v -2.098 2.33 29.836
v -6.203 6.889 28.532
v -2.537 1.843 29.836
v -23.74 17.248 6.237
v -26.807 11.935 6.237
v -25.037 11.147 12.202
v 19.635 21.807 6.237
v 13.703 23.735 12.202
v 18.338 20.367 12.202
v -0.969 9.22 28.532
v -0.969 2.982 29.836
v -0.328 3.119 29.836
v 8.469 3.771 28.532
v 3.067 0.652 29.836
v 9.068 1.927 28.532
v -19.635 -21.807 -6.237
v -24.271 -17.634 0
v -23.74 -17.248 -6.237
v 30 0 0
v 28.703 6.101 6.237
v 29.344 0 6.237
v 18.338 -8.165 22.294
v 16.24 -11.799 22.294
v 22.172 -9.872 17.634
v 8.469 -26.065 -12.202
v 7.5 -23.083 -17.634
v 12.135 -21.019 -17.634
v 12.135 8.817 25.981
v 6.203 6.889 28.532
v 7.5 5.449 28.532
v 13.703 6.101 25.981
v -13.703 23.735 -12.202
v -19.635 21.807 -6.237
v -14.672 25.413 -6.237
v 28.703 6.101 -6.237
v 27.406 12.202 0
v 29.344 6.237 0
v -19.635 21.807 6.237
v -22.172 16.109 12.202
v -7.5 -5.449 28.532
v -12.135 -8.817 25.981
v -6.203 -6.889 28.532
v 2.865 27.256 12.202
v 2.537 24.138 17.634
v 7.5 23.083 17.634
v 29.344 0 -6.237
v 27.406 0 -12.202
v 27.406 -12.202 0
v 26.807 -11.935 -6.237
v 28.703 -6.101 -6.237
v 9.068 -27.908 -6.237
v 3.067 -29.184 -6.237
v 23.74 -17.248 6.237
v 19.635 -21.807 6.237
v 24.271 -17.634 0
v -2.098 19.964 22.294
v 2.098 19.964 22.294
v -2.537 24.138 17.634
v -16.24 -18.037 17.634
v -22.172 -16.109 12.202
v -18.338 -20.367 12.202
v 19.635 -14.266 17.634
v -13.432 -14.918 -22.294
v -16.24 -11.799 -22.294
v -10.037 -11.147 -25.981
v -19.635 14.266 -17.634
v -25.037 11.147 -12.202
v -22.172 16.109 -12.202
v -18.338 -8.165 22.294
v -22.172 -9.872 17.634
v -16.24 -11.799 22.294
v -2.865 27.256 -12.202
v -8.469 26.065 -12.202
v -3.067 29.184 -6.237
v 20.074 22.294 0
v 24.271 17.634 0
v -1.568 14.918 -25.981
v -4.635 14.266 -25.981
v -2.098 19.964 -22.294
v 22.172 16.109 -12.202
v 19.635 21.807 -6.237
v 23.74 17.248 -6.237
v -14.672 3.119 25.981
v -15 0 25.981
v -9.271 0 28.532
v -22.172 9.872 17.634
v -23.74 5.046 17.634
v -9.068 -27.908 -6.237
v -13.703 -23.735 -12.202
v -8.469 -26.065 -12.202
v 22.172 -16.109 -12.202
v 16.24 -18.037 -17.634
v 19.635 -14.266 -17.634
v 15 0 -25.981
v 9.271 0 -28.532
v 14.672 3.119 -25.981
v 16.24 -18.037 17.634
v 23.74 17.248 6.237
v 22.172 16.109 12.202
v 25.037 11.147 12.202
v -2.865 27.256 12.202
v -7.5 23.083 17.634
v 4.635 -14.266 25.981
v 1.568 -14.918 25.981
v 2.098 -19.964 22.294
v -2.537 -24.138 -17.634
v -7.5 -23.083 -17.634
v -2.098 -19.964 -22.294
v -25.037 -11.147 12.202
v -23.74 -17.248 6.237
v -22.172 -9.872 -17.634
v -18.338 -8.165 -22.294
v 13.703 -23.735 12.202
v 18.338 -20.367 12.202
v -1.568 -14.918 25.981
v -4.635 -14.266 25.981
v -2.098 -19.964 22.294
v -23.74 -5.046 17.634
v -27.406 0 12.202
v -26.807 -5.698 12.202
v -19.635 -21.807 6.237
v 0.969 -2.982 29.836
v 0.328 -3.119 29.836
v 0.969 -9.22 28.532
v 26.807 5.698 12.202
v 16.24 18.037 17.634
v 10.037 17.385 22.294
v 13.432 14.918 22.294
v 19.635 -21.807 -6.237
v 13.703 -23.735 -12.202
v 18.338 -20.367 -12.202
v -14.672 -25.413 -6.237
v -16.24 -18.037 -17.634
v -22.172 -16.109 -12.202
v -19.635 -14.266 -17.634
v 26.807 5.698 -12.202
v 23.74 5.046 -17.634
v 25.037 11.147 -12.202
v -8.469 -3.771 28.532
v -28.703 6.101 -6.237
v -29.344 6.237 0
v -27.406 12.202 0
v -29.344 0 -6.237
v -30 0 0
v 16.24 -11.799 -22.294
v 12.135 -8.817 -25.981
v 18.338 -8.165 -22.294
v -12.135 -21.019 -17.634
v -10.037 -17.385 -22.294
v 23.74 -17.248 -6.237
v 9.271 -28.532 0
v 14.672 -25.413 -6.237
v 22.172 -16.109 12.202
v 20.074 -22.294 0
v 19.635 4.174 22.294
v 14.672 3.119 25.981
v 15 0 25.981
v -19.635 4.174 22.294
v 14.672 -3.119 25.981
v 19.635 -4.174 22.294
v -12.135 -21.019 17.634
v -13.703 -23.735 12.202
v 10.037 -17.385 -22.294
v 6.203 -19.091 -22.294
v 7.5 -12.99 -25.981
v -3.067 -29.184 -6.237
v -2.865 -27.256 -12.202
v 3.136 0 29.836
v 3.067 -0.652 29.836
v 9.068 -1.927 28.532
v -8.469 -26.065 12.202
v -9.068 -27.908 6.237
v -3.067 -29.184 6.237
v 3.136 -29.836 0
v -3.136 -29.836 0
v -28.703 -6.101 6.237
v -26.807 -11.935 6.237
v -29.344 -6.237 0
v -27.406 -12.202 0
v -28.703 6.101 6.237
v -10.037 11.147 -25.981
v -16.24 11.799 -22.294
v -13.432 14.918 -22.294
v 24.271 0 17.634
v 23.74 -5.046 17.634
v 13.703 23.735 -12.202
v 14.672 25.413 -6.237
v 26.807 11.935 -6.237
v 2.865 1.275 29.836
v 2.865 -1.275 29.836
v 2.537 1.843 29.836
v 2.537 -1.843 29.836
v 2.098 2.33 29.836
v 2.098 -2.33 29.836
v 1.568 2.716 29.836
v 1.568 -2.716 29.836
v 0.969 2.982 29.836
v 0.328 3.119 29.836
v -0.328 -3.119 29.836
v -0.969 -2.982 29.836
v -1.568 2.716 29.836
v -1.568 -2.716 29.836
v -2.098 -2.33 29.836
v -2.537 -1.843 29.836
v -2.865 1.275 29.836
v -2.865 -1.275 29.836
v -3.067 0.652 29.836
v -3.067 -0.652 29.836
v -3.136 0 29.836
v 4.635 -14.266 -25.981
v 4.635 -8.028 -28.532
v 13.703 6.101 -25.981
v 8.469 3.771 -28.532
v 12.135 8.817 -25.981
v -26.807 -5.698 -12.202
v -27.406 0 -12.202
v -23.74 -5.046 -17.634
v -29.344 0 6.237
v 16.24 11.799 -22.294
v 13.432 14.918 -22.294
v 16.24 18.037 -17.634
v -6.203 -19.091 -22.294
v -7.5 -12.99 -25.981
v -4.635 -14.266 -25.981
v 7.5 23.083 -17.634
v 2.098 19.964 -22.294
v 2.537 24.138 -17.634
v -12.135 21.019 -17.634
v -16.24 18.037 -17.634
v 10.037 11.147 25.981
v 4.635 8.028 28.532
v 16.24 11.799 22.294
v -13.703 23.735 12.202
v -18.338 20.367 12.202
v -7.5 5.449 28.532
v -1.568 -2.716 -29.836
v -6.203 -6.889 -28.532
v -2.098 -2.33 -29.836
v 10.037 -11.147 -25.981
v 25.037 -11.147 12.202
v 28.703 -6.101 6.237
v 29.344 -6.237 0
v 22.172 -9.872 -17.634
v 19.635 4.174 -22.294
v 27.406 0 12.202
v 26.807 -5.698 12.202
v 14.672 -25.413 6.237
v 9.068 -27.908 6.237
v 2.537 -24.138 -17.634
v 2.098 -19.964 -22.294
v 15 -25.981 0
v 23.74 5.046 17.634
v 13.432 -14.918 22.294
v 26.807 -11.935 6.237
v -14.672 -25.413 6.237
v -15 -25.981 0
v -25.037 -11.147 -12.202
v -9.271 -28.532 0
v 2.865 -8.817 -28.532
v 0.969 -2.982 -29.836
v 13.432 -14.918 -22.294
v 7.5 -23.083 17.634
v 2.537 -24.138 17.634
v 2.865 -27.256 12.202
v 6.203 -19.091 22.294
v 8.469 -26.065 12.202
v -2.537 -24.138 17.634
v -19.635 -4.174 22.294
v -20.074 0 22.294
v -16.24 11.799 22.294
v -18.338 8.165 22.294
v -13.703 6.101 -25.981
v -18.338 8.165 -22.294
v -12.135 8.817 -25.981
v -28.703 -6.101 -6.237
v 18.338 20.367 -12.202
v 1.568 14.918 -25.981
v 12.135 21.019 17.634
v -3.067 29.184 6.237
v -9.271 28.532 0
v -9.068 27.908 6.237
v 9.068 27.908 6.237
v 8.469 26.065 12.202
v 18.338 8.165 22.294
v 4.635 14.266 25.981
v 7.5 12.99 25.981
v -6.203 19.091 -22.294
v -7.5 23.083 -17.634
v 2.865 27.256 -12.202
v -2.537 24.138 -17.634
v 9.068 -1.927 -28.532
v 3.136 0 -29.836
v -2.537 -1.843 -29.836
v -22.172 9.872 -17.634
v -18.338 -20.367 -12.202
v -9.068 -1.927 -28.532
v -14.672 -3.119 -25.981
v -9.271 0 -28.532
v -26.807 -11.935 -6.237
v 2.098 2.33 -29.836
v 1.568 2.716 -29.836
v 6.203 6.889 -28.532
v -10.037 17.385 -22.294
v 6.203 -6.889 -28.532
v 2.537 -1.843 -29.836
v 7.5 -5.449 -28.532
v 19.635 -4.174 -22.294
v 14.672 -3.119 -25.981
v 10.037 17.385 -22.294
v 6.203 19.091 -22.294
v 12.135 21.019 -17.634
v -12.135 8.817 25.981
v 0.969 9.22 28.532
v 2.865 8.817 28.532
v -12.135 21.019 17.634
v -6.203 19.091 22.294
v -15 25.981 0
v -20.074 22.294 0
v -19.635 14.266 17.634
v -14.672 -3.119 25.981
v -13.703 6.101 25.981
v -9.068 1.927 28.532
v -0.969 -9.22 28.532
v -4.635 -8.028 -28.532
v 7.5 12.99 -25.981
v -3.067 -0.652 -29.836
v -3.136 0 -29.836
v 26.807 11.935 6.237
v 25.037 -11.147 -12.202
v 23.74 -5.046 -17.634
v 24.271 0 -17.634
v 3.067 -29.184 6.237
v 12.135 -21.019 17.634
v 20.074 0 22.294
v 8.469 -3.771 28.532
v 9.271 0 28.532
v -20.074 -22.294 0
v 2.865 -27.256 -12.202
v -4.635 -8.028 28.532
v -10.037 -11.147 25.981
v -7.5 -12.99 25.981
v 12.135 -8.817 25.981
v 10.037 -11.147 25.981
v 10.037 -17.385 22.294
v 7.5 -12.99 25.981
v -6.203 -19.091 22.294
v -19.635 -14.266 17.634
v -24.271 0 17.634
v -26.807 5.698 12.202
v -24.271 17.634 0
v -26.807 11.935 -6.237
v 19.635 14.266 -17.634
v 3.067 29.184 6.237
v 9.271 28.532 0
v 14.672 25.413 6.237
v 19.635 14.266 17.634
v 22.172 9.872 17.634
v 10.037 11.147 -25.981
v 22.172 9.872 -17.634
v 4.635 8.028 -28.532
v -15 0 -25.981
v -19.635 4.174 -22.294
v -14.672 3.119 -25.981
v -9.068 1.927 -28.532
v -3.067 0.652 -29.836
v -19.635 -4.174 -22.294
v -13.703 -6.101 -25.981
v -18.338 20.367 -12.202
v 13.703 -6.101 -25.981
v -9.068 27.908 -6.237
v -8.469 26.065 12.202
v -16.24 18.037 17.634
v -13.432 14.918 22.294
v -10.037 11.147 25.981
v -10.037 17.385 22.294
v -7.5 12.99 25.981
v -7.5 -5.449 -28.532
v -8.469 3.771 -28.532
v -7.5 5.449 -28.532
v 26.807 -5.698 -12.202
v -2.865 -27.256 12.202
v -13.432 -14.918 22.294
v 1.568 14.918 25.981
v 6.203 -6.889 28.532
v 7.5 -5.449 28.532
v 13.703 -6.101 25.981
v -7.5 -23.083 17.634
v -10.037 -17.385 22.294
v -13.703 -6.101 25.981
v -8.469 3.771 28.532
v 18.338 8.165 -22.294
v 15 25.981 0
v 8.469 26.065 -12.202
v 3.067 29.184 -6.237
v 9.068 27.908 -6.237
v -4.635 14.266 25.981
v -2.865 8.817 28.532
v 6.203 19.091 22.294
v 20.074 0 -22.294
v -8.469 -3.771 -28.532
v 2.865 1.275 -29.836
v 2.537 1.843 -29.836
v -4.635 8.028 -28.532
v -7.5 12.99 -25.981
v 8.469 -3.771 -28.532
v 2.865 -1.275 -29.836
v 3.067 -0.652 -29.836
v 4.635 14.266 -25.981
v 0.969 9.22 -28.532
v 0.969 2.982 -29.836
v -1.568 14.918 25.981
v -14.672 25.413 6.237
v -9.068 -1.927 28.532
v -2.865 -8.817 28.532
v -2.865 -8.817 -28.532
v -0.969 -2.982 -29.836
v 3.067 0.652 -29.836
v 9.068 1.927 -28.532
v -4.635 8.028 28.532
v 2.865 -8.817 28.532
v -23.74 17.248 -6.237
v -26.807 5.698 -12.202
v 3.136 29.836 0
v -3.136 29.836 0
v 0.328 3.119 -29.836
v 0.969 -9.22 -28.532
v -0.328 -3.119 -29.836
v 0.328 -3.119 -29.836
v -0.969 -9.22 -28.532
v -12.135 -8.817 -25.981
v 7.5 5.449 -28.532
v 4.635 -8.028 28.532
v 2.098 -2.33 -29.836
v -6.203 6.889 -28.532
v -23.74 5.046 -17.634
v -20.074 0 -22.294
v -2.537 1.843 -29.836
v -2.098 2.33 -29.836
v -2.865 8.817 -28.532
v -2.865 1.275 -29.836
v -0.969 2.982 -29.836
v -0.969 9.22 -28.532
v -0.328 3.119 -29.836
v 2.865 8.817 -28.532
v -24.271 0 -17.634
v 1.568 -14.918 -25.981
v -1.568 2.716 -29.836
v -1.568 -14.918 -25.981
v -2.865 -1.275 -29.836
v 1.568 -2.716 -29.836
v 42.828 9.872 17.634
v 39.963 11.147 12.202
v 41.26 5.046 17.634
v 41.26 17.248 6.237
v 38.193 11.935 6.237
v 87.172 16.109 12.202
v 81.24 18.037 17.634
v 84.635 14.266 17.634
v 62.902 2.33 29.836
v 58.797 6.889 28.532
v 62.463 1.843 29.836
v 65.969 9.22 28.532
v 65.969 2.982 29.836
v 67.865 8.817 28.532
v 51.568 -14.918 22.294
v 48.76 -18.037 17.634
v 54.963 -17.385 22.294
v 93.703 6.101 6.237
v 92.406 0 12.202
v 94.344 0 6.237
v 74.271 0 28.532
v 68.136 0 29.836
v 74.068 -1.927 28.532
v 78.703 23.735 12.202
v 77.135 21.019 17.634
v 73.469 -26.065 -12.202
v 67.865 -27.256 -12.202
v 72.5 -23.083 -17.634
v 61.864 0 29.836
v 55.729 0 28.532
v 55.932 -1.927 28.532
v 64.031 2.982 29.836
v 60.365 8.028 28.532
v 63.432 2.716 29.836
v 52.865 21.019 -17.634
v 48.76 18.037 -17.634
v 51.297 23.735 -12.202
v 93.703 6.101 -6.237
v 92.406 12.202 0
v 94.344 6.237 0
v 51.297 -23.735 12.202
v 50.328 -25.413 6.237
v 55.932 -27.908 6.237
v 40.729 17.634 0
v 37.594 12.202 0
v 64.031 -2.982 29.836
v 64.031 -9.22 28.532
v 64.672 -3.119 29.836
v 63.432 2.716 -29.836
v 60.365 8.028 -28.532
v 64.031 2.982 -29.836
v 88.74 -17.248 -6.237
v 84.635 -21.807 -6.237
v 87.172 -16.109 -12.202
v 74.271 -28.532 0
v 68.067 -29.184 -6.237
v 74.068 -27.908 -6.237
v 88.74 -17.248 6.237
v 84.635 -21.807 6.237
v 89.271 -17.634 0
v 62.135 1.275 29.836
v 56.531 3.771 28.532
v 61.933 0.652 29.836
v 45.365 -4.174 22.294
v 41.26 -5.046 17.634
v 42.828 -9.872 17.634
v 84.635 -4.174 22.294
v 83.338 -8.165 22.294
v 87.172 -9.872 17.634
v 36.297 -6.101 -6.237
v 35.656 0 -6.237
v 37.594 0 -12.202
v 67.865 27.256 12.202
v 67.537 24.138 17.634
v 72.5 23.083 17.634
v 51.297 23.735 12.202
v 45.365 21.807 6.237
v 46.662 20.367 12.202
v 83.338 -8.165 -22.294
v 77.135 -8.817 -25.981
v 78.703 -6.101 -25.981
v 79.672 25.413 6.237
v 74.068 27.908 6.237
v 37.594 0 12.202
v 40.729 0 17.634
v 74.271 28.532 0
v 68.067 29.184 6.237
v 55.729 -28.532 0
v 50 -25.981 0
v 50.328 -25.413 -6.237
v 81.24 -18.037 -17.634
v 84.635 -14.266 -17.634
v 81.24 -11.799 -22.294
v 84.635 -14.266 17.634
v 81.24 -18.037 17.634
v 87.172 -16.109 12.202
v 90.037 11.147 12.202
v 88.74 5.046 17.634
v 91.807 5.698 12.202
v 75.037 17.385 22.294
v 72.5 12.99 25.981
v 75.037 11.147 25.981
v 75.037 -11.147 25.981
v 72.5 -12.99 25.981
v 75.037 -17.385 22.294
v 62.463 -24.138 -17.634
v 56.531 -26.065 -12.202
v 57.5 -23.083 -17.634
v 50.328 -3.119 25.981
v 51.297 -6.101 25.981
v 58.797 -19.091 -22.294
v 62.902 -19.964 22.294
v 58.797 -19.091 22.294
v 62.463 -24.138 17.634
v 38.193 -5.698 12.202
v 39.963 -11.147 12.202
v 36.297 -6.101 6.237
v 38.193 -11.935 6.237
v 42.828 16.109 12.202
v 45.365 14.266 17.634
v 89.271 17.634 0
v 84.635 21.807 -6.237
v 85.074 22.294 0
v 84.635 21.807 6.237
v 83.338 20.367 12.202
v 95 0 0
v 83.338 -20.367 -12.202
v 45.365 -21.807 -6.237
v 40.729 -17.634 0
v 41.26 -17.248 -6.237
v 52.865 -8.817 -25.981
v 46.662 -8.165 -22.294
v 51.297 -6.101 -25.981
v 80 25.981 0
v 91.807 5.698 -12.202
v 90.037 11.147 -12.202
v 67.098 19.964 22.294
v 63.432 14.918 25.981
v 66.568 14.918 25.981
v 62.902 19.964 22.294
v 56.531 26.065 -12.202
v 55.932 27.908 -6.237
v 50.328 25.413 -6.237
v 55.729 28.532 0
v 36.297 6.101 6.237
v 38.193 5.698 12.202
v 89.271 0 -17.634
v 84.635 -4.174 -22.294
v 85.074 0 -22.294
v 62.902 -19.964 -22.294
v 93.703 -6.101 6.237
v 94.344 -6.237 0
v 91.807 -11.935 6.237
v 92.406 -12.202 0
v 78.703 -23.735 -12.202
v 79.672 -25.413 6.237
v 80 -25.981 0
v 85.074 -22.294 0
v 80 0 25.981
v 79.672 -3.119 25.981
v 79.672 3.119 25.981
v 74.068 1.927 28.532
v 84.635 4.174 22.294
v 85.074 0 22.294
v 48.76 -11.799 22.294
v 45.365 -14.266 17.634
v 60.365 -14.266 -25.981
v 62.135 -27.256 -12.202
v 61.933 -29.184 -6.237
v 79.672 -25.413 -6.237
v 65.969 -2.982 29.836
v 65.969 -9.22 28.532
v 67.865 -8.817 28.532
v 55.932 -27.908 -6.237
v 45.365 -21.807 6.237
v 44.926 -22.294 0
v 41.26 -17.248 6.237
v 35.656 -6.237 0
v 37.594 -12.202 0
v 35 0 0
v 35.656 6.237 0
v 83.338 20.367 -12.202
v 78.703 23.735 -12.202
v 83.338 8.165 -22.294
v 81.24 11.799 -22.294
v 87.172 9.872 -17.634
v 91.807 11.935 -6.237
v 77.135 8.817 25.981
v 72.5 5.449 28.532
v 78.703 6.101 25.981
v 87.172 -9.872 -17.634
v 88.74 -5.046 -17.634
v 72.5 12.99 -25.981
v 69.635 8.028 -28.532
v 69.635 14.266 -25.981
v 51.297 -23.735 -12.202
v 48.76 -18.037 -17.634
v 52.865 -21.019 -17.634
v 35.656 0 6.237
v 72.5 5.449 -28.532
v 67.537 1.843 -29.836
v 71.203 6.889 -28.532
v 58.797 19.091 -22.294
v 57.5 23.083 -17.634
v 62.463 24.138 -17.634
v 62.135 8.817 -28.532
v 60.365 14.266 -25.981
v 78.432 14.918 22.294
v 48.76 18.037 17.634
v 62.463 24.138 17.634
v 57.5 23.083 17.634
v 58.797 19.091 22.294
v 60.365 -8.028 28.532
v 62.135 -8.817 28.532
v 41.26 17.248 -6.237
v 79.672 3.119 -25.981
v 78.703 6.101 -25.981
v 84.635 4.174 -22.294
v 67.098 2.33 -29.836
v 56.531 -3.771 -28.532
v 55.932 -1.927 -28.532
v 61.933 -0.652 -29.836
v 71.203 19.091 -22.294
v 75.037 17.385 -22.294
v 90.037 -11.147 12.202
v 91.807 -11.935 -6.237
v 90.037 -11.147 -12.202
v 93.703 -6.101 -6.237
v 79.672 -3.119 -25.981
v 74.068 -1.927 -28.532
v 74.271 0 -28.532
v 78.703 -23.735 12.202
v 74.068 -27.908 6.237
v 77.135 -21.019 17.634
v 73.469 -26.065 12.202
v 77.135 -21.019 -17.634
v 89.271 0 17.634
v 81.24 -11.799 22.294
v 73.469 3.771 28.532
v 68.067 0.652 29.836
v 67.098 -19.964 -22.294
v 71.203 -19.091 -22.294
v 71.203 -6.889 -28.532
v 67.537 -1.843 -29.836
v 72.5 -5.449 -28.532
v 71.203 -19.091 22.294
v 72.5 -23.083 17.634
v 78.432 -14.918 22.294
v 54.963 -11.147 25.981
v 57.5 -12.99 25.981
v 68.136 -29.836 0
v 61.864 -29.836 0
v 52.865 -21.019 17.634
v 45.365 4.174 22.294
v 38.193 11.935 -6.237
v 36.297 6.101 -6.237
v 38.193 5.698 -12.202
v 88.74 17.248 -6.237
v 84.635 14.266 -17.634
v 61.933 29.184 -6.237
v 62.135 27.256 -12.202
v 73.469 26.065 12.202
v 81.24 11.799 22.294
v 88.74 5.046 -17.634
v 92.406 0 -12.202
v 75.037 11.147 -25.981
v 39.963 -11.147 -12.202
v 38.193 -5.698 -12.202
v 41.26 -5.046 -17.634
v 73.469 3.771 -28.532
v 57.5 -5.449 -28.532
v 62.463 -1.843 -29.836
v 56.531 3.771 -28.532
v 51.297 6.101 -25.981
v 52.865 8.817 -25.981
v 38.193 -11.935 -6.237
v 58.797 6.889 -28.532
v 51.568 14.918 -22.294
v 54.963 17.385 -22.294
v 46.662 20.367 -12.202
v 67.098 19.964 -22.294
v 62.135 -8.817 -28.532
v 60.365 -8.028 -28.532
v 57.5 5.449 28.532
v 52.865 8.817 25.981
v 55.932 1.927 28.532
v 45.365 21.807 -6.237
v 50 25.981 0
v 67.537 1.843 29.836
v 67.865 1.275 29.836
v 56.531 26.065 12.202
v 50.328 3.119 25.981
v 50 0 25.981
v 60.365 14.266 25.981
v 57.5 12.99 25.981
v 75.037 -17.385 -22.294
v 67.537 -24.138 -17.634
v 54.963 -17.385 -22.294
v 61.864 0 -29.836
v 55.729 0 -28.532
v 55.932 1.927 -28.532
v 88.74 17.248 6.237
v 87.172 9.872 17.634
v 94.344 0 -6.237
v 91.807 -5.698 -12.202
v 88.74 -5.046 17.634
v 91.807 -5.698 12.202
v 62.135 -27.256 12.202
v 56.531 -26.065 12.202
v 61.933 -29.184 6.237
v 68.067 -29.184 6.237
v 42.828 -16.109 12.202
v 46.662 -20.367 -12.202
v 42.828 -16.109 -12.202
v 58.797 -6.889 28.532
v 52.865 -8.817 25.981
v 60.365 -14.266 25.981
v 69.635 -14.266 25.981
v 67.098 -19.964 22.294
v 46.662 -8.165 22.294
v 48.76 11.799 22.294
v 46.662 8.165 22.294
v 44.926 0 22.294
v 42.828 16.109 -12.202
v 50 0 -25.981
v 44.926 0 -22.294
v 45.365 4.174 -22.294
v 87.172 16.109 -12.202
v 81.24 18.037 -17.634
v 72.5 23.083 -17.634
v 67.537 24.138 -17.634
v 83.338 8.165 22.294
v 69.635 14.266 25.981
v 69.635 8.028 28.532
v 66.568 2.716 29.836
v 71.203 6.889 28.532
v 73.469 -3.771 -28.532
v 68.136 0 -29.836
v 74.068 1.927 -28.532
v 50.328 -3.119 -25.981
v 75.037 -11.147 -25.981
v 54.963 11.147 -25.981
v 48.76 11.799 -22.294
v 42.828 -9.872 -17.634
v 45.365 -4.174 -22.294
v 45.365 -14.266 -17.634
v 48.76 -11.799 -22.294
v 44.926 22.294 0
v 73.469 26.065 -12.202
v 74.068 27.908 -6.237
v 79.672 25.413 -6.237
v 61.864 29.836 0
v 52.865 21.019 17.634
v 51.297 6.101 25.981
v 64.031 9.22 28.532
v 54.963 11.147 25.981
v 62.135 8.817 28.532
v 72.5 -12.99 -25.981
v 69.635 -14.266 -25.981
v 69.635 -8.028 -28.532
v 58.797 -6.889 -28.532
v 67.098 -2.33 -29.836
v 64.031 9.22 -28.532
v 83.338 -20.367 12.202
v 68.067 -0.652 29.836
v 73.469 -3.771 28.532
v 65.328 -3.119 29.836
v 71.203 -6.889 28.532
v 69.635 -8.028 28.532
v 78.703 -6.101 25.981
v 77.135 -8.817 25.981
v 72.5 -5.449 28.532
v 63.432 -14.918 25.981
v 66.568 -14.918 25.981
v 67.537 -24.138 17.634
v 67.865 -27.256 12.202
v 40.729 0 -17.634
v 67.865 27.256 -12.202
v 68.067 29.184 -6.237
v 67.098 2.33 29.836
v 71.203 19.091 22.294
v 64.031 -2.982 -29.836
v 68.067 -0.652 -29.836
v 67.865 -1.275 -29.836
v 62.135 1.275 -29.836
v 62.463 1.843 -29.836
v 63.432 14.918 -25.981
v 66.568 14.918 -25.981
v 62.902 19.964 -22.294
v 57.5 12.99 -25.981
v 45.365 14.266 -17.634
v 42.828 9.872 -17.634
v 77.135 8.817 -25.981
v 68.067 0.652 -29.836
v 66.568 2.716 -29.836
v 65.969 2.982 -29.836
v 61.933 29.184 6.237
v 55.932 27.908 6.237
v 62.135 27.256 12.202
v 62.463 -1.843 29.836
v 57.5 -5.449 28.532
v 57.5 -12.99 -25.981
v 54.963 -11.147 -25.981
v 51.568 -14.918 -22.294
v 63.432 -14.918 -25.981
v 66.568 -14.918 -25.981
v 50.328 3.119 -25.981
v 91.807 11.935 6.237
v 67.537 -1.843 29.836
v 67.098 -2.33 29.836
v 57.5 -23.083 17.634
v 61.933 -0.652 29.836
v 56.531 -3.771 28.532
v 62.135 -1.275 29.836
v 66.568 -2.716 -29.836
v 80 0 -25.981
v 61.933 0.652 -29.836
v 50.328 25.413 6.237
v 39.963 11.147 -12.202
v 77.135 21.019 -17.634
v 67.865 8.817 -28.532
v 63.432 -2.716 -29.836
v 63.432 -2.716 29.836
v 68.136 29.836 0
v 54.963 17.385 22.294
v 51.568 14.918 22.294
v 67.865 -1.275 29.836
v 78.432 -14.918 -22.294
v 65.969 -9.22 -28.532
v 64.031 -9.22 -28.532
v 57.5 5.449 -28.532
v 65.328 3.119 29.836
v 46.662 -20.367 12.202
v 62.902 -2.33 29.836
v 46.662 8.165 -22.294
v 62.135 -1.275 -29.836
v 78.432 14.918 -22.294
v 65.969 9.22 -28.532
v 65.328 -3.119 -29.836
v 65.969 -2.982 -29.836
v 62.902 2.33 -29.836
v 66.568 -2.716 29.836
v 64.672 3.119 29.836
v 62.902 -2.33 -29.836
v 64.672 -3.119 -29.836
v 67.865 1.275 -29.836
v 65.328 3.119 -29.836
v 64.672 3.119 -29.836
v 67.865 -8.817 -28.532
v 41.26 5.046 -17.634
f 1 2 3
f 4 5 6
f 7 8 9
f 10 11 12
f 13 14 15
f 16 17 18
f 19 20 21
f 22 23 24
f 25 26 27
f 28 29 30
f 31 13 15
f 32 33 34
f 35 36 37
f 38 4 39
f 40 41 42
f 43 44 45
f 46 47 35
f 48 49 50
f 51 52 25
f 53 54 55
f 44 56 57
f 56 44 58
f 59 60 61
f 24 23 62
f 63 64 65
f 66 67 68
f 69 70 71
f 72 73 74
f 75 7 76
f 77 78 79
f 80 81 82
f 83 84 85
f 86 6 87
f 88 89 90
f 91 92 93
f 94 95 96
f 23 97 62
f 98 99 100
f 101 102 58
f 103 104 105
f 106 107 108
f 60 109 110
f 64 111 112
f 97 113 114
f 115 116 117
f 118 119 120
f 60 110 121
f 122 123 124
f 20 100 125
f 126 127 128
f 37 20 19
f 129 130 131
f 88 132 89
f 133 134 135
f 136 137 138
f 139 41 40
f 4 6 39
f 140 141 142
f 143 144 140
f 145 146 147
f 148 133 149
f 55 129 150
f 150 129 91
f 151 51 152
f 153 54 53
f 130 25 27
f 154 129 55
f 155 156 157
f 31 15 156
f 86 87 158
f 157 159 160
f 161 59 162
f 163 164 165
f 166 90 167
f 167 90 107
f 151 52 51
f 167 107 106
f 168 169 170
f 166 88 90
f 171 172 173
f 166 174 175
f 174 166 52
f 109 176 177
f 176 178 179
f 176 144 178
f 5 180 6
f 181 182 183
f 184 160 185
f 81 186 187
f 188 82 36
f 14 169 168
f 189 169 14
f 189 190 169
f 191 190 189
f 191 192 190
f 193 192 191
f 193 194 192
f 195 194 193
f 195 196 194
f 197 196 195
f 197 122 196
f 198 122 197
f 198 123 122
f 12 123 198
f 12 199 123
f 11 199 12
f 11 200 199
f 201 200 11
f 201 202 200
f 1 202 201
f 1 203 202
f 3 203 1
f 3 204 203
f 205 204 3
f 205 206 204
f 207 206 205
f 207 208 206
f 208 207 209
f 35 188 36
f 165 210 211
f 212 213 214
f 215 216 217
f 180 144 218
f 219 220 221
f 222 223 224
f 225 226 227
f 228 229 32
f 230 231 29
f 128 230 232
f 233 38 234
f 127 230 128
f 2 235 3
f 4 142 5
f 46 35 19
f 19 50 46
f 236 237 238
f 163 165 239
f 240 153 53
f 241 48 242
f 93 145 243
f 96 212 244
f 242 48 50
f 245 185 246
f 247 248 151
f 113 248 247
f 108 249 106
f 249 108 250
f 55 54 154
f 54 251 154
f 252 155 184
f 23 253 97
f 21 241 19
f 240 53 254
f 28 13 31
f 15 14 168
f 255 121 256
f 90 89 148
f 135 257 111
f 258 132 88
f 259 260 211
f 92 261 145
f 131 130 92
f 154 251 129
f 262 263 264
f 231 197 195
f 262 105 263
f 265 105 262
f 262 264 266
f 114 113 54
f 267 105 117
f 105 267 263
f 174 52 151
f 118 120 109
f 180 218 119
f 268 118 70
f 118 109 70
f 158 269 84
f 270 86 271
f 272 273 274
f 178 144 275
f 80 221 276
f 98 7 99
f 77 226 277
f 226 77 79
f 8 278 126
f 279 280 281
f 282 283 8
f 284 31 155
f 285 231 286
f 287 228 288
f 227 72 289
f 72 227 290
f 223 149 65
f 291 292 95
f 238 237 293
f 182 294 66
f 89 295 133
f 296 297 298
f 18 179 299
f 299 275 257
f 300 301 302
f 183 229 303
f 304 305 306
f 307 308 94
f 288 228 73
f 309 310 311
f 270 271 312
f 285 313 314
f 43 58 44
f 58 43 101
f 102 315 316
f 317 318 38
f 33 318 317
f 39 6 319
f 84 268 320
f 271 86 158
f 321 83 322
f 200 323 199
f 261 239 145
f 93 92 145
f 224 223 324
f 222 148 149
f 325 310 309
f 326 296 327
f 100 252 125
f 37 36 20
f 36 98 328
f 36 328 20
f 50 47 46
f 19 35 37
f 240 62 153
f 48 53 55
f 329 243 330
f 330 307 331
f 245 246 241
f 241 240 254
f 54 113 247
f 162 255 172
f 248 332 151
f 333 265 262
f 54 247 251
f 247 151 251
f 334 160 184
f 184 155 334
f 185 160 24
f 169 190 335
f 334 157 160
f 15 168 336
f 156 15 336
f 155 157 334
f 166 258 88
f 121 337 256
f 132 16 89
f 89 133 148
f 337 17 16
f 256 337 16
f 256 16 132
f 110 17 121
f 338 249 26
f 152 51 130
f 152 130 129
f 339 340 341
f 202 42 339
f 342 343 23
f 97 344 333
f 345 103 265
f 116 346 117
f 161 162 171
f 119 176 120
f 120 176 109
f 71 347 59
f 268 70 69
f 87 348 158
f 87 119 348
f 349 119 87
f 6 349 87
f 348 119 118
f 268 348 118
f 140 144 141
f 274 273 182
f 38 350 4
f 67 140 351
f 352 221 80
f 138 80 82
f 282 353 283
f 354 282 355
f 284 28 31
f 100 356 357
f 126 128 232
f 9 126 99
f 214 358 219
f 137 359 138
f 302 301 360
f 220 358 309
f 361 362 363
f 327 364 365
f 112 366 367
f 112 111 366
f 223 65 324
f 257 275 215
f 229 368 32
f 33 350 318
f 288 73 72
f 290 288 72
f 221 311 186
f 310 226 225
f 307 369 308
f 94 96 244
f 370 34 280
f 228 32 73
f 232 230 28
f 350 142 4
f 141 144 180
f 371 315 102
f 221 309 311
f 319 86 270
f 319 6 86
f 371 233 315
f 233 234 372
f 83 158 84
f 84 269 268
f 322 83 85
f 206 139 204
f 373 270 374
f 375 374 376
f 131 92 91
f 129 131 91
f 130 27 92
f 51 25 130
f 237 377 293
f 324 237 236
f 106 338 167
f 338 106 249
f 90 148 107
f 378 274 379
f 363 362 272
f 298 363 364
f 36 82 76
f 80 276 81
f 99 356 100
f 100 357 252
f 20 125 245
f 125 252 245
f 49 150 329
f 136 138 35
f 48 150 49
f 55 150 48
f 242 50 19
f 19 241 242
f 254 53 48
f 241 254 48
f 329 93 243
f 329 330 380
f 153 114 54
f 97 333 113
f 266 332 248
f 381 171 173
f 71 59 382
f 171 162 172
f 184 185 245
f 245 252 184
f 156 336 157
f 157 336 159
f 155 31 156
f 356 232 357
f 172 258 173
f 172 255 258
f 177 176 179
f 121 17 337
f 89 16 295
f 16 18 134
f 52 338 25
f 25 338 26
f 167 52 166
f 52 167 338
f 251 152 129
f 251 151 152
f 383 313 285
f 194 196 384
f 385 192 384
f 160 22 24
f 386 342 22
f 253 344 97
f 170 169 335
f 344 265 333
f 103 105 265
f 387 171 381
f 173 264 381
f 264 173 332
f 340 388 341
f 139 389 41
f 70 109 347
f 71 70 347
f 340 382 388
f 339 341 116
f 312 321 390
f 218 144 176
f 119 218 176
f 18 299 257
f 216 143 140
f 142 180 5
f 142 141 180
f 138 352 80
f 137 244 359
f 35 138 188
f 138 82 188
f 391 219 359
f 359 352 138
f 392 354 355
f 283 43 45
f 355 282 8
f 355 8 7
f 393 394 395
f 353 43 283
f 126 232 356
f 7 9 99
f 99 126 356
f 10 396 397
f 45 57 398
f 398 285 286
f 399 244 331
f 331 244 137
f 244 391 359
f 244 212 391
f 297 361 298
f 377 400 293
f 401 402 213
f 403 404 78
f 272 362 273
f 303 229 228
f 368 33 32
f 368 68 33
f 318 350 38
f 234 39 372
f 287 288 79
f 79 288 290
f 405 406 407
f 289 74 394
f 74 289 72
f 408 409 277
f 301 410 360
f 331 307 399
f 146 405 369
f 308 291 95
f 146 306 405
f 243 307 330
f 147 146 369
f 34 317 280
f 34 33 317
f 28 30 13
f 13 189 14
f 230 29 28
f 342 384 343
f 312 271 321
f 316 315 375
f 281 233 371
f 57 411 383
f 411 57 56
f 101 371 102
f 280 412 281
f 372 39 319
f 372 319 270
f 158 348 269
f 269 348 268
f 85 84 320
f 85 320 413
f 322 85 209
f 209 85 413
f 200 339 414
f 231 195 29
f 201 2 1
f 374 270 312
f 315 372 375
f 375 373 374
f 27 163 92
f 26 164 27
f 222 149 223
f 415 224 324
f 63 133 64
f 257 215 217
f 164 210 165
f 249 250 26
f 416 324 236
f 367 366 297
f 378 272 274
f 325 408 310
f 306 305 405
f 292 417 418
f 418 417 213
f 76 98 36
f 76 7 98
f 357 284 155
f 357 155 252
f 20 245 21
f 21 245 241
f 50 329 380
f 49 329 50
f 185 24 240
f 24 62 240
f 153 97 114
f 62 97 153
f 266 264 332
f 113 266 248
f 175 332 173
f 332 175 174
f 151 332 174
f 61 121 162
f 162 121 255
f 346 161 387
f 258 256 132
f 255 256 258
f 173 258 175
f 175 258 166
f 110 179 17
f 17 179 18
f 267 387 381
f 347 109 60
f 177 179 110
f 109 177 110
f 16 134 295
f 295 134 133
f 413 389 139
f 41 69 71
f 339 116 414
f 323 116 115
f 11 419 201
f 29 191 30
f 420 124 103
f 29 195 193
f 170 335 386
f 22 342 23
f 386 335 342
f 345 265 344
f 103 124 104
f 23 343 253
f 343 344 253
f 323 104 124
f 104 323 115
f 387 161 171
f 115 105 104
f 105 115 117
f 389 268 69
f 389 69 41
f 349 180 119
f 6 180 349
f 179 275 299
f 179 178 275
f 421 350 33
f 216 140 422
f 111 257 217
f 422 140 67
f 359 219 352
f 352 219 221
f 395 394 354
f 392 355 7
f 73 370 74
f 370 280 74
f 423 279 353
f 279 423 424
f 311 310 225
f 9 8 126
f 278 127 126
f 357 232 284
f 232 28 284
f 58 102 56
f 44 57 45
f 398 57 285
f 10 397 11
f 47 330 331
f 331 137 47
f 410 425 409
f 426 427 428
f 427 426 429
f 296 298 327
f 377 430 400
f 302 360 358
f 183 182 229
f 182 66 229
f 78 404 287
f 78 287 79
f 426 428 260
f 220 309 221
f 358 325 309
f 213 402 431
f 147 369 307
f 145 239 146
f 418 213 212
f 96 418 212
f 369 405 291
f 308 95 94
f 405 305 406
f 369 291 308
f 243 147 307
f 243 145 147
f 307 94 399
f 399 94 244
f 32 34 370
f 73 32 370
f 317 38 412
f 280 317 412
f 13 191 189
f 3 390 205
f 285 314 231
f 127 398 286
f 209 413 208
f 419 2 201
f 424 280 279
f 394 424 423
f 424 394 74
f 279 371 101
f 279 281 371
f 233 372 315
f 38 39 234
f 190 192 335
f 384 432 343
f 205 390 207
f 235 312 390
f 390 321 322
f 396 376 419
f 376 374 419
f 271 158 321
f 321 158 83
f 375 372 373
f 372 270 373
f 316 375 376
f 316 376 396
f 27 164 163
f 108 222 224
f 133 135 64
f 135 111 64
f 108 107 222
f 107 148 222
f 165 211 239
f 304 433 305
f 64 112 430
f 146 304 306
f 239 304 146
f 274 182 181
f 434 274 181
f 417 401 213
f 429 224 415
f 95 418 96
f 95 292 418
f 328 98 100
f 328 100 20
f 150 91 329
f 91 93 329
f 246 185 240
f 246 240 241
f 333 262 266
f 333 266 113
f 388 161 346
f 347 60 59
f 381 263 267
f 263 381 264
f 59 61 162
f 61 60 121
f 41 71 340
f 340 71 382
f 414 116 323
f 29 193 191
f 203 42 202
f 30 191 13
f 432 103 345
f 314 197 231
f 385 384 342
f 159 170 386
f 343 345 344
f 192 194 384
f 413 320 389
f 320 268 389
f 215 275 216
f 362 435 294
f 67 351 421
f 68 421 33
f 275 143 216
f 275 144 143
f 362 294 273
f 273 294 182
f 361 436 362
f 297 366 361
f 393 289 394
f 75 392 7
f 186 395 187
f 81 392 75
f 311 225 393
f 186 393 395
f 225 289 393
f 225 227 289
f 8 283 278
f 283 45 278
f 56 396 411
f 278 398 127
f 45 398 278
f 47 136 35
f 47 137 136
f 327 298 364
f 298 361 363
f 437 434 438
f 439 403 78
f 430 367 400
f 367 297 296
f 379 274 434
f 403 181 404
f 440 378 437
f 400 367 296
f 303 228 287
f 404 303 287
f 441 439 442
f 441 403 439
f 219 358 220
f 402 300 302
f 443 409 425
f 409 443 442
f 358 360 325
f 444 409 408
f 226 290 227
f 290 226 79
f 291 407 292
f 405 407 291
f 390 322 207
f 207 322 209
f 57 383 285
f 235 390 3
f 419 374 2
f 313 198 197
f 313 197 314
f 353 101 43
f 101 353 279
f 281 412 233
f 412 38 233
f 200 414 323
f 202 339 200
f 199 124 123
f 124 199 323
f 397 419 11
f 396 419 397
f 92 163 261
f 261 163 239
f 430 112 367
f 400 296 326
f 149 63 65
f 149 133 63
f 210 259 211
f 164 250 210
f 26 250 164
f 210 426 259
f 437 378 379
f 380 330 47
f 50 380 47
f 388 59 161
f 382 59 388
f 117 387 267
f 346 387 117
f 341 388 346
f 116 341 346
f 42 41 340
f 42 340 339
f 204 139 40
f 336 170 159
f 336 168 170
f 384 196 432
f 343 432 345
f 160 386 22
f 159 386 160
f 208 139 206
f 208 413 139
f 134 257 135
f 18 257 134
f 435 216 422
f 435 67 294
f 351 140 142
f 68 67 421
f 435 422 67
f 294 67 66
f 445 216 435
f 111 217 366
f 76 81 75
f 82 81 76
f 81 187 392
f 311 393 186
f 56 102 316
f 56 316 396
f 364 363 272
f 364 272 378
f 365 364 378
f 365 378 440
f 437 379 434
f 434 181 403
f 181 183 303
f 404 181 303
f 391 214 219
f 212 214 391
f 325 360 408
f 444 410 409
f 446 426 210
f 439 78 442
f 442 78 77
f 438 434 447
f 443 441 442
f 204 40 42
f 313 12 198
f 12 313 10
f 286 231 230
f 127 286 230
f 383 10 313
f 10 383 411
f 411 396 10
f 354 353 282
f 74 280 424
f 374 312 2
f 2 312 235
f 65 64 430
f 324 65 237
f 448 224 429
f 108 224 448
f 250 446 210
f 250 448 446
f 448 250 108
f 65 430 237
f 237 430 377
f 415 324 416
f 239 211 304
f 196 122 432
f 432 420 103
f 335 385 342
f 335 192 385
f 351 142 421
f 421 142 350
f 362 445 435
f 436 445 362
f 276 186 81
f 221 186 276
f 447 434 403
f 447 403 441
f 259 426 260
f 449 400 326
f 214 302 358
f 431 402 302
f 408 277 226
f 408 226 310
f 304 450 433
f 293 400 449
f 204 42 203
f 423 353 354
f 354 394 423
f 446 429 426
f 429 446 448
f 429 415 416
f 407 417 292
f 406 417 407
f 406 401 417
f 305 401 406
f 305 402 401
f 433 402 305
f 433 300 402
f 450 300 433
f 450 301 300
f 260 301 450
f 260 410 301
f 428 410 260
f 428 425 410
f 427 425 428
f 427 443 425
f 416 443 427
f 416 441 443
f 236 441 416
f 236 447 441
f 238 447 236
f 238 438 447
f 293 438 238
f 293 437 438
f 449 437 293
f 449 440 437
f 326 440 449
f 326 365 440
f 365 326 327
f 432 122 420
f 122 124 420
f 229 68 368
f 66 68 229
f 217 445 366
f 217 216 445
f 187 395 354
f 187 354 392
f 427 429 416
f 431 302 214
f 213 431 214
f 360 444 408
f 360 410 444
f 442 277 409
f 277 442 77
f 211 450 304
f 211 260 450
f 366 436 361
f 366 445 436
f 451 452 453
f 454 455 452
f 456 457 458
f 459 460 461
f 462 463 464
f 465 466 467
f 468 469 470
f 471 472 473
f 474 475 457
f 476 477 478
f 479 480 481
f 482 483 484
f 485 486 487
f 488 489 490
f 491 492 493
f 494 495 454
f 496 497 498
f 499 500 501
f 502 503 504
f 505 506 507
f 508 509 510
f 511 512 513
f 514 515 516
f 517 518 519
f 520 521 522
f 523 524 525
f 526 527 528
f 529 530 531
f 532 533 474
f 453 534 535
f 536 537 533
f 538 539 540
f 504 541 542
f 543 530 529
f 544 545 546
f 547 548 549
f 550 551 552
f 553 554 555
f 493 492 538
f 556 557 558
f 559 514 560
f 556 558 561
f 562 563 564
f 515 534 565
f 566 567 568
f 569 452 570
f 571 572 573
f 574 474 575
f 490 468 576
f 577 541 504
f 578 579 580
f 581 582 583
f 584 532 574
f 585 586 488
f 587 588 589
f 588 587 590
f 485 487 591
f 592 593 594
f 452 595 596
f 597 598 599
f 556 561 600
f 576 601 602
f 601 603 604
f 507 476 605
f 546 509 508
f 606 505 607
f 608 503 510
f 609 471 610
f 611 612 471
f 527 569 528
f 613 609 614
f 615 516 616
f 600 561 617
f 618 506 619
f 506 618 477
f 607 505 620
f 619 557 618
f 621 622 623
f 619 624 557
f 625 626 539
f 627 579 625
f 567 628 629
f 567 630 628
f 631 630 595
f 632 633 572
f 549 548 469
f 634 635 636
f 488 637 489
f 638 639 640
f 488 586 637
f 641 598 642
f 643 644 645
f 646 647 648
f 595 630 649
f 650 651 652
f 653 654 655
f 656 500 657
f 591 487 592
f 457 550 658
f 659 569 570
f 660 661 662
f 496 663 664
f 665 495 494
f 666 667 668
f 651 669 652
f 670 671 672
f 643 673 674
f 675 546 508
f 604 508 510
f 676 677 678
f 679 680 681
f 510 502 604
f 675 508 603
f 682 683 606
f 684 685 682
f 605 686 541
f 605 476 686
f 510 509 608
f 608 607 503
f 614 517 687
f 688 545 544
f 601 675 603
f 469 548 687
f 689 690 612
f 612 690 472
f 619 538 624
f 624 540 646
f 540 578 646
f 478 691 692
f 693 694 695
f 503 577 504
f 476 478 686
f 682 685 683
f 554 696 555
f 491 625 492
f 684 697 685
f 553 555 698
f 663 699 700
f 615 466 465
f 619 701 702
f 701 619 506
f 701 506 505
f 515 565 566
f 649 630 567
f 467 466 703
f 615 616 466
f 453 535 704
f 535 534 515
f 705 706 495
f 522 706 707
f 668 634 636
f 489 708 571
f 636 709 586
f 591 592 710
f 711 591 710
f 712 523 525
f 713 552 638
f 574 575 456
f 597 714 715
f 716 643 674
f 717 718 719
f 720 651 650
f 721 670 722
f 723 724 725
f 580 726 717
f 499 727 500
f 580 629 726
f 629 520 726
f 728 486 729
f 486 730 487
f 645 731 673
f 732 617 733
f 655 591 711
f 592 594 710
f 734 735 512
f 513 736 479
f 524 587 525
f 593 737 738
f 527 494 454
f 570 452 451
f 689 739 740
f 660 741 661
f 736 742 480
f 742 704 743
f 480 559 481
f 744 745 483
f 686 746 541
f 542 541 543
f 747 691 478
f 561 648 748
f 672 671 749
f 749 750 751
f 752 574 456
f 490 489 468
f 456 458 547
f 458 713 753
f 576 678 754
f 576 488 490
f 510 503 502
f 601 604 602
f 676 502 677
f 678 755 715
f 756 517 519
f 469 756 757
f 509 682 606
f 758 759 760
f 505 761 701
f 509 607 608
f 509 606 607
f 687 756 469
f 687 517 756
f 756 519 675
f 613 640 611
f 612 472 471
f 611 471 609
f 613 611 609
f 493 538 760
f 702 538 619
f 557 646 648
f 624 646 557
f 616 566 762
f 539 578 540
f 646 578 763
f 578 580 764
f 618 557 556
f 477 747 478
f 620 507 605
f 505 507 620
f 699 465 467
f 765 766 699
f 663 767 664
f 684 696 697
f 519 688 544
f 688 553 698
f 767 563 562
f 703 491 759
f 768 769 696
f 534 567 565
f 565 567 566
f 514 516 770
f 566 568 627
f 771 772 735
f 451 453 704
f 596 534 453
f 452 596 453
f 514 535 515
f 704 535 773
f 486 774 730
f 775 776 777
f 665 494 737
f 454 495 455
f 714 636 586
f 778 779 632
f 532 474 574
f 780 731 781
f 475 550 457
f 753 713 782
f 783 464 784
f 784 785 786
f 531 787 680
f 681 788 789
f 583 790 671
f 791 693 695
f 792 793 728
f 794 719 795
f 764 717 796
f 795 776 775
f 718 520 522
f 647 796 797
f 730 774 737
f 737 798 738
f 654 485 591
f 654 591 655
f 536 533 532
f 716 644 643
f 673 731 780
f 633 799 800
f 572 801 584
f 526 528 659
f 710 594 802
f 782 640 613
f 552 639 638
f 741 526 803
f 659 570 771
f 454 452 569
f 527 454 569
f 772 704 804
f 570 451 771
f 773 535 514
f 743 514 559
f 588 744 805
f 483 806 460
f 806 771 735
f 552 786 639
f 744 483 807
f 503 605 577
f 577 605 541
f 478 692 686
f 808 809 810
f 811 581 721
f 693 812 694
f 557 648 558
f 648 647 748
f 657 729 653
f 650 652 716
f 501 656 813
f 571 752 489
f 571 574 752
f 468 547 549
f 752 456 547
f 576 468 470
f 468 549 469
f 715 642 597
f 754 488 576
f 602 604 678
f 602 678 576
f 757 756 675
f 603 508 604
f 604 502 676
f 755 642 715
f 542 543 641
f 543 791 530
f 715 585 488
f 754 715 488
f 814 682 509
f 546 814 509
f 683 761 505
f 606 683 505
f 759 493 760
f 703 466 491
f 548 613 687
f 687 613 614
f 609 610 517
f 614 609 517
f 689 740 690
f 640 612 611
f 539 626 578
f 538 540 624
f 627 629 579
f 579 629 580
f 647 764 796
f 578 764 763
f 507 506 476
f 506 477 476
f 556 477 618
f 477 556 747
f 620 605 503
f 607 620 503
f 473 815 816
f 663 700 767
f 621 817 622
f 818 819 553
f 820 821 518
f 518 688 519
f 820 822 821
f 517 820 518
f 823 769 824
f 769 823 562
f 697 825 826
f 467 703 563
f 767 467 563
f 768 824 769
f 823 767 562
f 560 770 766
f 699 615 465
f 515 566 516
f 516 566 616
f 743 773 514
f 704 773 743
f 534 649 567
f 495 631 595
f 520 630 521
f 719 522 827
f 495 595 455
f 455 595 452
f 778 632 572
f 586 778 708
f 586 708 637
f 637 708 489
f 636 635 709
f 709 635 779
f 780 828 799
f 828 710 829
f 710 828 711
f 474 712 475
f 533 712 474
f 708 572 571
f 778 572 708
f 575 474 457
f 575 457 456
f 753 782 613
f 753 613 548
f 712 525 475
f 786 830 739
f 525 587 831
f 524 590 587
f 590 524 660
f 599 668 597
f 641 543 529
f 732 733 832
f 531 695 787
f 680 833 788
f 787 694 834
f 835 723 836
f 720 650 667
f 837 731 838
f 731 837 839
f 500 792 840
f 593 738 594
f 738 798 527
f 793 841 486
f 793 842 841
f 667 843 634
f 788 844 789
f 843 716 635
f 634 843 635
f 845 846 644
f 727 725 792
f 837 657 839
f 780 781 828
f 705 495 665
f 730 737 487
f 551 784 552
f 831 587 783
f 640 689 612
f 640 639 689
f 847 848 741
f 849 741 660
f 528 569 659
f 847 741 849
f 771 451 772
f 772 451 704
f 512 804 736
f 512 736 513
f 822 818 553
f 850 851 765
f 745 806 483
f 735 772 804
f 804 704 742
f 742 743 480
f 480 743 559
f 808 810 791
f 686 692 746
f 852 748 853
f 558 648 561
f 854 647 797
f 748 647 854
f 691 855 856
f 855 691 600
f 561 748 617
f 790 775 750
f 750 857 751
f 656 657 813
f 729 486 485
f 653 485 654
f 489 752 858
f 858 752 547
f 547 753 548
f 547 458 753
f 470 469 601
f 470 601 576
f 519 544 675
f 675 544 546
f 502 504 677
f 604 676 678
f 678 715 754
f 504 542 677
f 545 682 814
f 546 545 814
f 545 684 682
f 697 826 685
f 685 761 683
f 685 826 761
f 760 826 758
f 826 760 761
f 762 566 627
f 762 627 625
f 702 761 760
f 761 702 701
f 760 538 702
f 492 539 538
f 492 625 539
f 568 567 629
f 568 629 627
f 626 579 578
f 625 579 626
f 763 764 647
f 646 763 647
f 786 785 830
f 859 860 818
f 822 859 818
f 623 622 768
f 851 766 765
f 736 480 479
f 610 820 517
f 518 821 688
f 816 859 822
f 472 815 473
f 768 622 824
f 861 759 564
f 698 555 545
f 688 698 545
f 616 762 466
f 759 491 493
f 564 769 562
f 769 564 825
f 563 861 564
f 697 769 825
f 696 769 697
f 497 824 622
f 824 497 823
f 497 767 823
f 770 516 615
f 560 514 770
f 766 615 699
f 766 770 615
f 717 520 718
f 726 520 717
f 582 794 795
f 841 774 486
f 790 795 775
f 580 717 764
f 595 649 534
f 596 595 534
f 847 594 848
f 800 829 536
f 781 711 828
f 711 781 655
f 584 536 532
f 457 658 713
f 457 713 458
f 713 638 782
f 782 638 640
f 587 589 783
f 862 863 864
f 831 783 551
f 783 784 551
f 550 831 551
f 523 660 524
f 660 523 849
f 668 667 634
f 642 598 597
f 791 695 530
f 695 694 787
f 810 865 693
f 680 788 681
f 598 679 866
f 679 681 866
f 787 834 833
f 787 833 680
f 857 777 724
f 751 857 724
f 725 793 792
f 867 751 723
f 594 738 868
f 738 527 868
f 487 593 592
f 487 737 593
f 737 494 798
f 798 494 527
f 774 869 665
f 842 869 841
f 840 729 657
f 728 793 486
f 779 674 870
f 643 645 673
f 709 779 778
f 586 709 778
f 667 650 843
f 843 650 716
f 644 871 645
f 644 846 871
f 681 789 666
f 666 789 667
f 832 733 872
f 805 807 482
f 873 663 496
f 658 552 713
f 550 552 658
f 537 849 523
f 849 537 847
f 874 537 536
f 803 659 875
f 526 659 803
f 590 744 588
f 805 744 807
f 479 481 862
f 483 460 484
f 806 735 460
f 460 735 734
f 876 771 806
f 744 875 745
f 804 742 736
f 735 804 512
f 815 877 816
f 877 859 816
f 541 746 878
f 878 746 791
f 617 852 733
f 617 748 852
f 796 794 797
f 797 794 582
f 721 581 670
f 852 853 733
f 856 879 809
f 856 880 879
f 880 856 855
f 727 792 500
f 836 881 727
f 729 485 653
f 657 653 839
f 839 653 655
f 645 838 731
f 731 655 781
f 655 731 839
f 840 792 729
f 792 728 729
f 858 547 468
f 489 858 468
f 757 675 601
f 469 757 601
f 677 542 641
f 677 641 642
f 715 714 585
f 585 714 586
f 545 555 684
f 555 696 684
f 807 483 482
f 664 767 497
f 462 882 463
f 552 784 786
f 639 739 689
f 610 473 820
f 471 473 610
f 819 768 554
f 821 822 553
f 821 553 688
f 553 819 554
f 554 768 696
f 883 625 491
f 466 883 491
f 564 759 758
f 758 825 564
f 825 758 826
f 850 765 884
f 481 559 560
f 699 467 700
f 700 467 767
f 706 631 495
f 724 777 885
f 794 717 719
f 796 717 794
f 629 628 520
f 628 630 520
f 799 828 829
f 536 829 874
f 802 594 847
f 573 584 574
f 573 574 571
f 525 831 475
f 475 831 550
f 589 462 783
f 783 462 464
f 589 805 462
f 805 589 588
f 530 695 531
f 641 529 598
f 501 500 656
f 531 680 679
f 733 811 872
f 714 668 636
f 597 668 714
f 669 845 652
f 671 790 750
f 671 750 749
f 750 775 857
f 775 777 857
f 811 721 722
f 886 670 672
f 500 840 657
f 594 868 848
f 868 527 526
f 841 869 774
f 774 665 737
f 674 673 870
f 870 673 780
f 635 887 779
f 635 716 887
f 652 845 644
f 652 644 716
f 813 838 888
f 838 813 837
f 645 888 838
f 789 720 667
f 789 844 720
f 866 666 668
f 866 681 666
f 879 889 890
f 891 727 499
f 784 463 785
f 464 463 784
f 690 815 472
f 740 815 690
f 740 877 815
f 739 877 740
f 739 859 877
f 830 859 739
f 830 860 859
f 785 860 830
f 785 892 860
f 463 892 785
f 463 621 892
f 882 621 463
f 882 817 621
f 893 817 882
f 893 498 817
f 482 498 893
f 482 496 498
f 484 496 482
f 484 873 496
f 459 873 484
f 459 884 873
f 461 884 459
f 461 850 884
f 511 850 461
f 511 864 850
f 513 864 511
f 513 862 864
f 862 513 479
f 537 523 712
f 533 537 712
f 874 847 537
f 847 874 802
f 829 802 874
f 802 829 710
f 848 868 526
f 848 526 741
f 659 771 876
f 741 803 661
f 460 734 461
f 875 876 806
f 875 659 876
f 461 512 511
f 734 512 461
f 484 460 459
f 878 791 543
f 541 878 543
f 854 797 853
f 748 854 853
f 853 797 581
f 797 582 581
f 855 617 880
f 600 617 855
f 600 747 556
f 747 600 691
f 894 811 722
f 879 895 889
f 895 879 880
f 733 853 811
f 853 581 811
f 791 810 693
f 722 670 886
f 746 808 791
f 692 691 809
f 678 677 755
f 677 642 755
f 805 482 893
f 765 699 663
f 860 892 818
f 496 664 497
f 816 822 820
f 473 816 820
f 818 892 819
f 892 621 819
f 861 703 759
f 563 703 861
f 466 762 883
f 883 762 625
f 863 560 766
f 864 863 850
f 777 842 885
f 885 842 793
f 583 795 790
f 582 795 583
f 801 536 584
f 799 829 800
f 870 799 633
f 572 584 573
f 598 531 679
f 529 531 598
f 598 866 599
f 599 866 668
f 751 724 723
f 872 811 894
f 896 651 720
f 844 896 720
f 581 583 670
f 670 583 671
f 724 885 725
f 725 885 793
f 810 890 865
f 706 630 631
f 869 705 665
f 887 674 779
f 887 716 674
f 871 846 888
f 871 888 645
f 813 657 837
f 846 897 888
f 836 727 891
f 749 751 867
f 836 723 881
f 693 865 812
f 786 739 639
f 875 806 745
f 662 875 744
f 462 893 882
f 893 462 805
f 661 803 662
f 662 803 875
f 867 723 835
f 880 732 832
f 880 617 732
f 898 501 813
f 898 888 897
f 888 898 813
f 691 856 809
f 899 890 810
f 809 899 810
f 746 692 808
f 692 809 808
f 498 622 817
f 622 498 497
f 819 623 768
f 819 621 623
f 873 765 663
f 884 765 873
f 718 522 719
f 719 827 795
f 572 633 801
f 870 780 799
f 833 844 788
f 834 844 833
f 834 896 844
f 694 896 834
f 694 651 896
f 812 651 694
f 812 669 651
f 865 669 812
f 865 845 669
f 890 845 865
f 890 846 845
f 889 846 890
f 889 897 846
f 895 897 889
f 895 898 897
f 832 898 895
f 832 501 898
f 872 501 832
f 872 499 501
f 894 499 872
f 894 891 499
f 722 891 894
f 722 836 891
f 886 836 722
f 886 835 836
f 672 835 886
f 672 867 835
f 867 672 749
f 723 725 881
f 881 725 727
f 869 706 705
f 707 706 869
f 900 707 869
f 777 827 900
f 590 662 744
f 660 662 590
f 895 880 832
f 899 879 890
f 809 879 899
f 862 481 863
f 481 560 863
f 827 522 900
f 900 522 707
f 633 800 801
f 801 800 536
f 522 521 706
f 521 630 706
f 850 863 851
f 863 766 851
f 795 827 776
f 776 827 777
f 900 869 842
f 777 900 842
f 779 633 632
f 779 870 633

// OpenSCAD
module lineup(num, space) {
  for (i = [0 : num-1])
    translate([ space*i, 0, 0 ]) child(0);
}

lineup(2, 65) sphere(30);
